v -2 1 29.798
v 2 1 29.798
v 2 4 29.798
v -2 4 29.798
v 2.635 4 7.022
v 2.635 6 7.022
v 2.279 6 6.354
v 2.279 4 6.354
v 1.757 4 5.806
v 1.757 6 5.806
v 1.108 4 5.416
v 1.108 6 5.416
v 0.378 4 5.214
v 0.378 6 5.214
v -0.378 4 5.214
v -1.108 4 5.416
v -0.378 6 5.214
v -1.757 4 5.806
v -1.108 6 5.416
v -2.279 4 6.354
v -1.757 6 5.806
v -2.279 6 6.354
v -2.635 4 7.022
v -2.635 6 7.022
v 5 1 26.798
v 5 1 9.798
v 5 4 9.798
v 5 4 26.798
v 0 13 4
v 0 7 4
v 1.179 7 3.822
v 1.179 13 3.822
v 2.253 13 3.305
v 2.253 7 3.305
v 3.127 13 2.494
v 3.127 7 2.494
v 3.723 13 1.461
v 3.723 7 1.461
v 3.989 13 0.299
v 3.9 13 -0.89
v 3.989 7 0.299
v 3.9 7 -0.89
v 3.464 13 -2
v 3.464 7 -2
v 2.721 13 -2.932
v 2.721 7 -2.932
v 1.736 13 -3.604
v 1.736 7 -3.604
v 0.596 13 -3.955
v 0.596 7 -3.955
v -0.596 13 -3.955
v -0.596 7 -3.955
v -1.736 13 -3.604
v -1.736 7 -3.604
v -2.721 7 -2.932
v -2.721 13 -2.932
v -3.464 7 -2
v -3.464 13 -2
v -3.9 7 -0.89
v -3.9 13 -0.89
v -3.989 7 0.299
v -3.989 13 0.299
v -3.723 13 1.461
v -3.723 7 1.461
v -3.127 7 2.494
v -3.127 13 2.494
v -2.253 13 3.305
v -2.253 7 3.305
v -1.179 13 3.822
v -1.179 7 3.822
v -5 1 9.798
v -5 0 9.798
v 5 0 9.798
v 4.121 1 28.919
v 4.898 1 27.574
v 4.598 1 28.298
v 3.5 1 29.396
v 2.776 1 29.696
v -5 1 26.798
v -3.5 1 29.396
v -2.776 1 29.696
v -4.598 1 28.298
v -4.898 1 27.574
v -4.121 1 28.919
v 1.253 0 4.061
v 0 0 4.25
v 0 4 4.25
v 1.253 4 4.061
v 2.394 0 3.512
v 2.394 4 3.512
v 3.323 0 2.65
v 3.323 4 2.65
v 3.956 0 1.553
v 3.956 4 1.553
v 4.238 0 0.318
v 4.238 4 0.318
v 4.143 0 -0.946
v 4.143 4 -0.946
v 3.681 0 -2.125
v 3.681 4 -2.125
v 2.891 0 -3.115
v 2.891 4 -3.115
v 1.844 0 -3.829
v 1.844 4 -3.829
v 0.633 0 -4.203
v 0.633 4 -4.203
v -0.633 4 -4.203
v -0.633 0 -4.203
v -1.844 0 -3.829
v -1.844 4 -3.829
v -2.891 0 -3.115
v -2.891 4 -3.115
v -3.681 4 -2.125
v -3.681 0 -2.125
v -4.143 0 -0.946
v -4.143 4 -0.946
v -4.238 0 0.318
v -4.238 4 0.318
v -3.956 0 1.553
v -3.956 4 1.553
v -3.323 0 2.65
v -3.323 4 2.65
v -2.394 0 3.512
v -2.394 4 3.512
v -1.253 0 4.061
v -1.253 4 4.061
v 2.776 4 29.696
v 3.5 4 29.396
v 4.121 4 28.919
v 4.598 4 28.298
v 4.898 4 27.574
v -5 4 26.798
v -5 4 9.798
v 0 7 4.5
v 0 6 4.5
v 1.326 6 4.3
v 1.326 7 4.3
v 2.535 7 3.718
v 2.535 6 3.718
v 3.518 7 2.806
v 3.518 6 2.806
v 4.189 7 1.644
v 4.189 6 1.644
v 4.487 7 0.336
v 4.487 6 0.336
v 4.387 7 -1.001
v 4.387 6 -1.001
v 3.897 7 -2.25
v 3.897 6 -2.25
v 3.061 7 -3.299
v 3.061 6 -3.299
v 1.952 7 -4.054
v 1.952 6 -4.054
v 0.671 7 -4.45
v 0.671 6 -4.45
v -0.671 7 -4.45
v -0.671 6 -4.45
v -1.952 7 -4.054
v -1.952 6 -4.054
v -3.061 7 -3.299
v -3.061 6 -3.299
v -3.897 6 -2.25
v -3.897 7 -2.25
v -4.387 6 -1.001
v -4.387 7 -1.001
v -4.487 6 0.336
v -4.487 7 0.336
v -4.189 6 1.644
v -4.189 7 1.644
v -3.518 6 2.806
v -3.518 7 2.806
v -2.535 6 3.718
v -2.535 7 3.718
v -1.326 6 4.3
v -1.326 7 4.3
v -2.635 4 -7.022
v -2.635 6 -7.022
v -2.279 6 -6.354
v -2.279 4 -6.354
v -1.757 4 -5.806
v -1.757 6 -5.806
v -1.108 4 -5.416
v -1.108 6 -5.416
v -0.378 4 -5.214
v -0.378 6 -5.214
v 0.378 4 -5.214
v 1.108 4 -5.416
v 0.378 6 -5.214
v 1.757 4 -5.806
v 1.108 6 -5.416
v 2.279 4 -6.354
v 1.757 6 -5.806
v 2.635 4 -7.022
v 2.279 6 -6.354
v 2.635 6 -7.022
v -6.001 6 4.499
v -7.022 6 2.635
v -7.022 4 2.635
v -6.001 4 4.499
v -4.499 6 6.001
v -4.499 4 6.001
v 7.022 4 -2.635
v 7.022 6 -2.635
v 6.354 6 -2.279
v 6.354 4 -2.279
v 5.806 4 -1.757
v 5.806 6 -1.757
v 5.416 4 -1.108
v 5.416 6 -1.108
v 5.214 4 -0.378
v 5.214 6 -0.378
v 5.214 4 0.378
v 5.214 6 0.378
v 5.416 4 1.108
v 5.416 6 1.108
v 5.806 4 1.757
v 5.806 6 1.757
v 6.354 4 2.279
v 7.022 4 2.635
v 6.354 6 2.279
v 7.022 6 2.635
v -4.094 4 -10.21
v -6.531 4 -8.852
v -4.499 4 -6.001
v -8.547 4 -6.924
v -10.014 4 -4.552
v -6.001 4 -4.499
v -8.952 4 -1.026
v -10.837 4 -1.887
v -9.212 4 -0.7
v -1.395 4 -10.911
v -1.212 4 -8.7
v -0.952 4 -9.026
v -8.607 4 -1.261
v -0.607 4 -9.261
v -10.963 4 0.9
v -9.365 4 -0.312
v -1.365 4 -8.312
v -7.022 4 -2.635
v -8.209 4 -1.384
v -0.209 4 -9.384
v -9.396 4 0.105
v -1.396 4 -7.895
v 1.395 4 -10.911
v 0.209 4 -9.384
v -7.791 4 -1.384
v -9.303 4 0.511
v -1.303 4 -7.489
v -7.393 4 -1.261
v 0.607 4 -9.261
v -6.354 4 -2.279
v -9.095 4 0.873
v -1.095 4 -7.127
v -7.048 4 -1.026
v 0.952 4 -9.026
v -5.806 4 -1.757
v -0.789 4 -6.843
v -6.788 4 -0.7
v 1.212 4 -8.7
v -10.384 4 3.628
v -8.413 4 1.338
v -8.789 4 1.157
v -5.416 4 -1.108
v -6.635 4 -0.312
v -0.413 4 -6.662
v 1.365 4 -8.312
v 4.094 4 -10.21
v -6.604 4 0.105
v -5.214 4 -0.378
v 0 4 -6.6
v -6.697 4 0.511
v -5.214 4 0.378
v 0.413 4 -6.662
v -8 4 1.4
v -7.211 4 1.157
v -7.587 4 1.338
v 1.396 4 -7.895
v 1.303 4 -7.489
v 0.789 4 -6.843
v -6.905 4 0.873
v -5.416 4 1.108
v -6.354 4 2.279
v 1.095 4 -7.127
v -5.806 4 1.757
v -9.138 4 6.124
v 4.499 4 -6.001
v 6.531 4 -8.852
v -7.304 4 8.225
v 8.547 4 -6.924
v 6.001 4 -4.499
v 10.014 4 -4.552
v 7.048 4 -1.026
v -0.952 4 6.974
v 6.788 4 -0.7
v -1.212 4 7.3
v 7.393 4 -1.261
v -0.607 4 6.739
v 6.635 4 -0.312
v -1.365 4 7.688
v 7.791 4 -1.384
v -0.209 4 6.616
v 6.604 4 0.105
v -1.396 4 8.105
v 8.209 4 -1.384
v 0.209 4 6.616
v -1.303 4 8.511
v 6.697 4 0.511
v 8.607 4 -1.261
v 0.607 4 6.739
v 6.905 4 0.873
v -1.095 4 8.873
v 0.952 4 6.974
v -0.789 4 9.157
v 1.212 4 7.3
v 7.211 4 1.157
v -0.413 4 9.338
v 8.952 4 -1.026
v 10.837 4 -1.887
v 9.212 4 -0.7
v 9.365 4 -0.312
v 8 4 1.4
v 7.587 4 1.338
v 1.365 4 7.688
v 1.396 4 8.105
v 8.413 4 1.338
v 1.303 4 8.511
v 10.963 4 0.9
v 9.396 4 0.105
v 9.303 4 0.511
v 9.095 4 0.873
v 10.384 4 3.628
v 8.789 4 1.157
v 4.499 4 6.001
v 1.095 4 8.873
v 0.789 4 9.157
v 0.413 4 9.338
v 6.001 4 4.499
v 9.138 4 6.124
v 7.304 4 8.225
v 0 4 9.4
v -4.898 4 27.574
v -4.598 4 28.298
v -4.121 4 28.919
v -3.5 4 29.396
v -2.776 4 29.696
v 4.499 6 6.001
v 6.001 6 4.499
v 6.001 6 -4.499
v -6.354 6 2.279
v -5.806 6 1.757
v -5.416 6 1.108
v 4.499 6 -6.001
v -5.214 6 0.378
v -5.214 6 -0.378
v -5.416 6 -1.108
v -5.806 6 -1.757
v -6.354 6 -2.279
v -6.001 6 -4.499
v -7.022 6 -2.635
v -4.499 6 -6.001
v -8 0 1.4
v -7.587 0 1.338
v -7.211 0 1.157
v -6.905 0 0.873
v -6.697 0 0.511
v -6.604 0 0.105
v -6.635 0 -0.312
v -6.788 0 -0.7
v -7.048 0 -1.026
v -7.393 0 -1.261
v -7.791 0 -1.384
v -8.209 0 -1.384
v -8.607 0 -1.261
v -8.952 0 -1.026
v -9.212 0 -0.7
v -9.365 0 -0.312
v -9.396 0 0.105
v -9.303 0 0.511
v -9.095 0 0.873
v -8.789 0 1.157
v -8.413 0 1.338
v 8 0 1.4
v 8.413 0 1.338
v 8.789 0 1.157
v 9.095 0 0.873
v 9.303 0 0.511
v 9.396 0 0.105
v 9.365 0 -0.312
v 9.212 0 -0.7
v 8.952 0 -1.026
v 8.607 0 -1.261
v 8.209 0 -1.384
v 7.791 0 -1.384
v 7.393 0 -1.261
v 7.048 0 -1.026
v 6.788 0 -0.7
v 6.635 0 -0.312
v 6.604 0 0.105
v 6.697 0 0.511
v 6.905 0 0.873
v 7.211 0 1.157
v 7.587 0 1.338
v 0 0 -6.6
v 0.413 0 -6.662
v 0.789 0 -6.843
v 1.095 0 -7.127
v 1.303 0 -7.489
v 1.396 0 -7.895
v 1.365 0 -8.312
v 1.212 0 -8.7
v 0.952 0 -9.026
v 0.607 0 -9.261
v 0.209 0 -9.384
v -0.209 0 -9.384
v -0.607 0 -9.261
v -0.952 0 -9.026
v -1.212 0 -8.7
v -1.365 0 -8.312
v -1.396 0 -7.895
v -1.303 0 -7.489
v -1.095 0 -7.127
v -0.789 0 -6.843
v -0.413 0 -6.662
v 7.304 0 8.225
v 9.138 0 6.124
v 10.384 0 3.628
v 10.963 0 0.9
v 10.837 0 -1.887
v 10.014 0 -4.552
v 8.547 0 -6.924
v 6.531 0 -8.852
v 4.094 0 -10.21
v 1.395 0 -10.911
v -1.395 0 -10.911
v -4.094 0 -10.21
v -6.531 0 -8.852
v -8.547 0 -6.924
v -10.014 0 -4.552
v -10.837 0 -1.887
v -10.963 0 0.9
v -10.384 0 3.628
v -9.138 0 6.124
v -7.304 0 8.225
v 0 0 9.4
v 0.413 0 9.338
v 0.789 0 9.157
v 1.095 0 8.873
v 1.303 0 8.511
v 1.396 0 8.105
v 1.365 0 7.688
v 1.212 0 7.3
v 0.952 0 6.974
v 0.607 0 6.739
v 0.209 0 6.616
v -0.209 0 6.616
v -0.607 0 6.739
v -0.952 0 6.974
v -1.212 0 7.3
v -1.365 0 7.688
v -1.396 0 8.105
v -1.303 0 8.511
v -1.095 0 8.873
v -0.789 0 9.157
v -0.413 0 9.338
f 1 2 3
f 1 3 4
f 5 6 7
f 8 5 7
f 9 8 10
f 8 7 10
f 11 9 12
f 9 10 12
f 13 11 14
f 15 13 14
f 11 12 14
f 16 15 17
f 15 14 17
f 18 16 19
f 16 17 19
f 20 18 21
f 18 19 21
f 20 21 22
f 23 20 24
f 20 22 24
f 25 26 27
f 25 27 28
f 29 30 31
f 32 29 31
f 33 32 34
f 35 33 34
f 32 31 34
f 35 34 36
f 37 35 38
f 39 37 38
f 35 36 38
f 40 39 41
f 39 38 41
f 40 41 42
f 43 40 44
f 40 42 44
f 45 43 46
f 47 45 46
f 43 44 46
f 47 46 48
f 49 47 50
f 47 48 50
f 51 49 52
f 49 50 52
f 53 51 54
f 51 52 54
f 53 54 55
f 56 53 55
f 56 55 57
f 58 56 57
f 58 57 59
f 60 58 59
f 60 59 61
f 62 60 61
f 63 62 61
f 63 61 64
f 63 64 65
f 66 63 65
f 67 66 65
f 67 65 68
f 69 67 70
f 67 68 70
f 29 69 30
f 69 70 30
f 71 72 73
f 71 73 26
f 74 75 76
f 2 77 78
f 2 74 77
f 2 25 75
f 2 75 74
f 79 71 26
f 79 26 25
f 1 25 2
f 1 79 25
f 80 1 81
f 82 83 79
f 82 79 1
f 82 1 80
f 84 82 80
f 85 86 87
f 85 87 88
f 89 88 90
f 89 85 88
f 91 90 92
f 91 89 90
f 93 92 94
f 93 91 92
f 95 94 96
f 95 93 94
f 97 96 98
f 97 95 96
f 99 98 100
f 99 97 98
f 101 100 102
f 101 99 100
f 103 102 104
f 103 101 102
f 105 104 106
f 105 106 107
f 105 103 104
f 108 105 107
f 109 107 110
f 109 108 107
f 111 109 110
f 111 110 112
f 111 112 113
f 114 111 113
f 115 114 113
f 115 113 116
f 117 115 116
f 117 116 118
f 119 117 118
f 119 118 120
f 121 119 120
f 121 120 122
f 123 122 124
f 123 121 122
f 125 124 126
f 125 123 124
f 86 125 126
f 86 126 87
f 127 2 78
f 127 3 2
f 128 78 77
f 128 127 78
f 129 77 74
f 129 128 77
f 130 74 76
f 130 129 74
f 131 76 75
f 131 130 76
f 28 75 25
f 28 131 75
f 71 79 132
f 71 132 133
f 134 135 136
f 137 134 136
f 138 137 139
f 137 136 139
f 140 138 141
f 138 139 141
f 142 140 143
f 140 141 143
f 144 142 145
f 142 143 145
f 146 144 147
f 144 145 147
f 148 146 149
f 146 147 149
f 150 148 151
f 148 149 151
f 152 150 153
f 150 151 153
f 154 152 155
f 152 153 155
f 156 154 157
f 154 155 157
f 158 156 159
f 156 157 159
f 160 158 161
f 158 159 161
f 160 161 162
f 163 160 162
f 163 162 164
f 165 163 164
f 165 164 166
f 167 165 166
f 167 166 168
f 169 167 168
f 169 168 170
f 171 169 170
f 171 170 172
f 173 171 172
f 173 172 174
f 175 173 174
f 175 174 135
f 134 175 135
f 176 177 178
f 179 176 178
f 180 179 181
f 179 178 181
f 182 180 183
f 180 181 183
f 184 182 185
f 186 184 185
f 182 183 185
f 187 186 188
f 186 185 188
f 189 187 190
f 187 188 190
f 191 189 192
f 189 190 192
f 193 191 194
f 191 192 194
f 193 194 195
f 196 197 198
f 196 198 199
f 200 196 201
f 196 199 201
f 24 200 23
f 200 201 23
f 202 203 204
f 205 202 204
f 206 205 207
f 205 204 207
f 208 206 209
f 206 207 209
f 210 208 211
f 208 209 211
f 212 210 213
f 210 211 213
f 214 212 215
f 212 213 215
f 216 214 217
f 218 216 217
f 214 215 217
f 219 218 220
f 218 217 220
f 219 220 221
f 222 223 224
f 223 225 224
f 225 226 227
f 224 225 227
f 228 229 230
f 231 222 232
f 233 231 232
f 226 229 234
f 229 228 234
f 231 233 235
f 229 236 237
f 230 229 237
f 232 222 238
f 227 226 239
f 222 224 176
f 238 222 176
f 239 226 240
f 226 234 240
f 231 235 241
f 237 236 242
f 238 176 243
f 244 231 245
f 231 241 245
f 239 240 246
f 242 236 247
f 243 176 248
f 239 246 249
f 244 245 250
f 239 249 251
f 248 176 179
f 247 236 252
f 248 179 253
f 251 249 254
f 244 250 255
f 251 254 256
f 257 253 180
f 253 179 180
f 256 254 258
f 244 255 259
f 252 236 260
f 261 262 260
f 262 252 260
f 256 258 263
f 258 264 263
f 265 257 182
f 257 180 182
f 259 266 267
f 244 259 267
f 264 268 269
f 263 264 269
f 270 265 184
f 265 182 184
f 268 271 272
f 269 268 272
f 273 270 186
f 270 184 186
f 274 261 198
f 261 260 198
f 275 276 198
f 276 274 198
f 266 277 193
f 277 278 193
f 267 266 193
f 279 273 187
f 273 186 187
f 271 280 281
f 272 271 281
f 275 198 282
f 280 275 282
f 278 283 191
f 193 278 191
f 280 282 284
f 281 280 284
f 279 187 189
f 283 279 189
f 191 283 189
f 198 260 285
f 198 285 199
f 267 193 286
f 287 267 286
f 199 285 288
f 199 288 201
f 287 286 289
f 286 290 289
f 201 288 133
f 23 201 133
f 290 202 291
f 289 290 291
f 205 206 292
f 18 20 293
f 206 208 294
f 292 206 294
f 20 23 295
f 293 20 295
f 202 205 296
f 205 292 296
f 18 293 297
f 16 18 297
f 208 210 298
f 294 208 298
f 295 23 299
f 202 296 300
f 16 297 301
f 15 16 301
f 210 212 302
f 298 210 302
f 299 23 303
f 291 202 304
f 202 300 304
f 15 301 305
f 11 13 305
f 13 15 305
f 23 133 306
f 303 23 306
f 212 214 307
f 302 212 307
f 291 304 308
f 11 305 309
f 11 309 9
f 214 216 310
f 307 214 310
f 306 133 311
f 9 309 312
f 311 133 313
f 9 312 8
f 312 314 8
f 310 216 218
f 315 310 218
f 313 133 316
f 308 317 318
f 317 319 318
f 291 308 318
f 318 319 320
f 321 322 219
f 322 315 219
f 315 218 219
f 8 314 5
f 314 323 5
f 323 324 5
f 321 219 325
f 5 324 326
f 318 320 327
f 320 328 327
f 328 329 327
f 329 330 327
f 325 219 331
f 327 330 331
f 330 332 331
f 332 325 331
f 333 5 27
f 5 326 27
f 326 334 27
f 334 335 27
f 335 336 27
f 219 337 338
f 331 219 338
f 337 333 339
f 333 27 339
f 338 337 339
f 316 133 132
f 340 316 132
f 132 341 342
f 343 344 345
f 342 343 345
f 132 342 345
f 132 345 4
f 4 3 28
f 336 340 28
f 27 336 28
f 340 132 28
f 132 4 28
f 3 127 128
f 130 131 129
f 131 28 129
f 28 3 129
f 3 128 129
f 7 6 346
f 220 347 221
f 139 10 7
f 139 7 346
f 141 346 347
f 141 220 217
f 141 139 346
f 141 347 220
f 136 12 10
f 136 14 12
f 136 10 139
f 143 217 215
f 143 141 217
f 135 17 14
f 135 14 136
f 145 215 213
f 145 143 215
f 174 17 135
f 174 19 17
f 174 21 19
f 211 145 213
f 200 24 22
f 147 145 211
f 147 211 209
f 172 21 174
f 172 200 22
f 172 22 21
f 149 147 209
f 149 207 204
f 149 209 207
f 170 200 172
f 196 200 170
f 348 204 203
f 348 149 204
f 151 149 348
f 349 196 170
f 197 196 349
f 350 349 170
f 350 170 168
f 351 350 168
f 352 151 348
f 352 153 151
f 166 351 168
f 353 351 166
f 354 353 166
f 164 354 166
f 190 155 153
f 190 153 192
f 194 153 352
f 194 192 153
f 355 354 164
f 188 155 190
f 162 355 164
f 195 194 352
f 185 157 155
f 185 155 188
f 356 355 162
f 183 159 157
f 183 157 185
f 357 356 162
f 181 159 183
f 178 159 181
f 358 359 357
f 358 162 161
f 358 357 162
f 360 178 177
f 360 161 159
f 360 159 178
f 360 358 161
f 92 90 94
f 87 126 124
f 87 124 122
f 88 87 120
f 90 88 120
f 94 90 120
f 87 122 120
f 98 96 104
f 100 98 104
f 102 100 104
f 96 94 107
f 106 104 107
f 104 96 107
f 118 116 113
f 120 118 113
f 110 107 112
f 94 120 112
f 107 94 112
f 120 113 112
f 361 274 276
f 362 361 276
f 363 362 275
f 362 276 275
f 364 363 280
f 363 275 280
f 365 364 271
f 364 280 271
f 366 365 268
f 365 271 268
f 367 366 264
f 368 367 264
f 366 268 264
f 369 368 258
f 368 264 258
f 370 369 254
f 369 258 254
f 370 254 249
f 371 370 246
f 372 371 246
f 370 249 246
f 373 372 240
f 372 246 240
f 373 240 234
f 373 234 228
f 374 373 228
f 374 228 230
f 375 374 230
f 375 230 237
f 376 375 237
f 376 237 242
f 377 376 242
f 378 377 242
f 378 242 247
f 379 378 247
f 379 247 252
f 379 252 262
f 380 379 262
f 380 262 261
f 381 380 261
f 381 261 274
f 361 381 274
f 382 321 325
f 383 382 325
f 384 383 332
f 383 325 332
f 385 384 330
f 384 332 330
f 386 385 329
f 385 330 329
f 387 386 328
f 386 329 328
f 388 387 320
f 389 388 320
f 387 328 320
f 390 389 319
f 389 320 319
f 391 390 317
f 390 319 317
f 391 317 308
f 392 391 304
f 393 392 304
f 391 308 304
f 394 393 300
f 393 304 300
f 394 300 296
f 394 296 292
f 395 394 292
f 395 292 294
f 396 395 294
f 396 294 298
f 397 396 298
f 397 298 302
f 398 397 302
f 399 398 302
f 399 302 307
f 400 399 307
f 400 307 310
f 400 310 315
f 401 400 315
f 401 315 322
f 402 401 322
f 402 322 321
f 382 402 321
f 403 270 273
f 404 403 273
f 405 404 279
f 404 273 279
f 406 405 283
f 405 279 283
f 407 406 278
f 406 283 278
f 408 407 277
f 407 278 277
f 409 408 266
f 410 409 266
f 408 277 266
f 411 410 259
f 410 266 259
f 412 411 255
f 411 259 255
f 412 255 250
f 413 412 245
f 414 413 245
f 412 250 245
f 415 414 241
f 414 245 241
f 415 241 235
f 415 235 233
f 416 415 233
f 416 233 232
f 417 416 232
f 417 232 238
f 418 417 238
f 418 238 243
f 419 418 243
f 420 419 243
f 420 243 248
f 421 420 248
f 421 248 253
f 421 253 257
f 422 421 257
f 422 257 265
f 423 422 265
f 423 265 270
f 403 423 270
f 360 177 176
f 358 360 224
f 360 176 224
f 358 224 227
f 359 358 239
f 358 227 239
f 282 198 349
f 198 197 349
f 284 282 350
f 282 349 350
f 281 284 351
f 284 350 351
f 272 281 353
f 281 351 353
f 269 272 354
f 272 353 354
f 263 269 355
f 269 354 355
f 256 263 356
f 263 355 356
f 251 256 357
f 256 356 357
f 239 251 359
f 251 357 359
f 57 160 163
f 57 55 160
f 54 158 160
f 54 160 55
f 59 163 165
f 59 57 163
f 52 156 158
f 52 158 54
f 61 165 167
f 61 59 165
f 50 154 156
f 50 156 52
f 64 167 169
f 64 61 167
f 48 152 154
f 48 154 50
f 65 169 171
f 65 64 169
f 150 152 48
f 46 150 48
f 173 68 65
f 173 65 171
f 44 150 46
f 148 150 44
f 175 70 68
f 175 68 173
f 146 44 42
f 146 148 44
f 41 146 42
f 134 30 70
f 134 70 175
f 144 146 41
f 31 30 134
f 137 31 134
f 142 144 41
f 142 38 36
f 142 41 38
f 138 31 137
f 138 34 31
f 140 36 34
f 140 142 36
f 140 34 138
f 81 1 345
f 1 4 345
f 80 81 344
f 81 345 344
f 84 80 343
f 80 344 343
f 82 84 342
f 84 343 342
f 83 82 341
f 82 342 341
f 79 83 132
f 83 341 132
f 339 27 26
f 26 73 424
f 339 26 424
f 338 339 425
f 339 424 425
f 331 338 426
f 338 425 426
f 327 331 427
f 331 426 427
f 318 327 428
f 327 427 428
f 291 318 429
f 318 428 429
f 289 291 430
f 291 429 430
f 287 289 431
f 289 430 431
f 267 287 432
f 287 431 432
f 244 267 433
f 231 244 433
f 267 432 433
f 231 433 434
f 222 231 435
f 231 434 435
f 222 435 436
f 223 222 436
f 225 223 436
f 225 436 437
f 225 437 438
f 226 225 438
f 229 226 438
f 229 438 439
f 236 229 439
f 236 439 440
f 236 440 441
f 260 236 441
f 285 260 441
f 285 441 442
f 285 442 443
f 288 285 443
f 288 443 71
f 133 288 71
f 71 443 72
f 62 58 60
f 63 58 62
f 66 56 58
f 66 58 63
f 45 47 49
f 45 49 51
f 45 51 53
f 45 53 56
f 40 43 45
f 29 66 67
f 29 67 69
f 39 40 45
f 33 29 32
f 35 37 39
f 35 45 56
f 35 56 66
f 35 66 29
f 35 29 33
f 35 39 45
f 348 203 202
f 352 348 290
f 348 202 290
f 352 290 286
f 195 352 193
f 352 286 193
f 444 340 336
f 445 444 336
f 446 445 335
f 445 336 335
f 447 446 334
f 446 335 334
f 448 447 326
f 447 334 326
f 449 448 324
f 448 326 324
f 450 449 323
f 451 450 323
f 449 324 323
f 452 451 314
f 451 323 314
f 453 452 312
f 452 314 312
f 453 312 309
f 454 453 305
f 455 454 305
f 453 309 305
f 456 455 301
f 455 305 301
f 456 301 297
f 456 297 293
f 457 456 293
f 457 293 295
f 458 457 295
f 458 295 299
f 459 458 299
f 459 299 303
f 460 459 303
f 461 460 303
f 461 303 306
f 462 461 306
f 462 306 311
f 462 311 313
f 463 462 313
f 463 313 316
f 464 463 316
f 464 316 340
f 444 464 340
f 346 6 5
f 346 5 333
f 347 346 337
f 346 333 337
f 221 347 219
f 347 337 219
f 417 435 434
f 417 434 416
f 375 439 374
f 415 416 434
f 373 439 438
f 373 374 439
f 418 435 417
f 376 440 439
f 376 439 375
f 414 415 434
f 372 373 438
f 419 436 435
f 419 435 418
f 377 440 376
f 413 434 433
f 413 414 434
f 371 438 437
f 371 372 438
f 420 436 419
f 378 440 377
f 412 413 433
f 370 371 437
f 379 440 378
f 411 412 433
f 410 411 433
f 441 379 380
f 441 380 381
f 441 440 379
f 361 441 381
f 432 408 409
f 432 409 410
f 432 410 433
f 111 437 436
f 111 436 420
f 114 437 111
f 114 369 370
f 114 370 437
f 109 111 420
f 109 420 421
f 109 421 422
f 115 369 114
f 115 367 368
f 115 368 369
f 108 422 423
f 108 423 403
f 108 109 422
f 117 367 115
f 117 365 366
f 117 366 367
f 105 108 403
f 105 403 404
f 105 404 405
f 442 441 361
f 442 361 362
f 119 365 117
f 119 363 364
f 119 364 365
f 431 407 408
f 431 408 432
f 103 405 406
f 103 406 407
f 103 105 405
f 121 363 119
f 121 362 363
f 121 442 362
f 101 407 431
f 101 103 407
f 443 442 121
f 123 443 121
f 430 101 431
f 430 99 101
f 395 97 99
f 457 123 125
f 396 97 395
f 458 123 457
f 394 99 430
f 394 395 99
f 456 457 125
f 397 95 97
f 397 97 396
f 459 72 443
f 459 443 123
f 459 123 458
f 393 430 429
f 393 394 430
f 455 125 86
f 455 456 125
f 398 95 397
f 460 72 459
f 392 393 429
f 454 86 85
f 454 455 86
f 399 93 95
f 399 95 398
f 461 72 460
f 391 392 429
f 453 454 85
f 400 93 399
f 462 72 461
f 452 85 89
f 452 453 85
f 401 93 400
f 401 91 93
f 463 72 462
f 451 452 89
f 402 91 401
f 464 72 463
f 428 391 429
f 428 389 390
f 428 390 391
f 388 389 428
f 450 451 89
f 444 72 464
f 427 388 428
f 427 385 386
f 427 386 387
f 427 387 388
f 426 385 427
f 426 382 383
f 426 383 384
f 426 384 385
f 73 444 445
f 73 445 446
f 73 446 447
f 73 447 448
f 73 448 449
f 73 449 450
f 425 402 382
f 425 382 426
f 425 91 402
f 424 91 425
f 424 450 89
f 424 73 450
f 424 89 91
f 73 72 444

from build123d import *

# Parameters (mm, degrees)
SKETCH1_R           = 11
SKETCH1_R_2         = 4.25
BOSS_EXTRUDE1_DEPTH = 4
SKETCH2_R           = 1.4
CUT_EXTRUDE1_DEPTH  = 17.062378404
SKETCH3_R           = 7.5
BOSS_EXTRUDE2_DEPTH = 2
SKETCH4_R           = 2.811136831
CUT_EXTRUDE2_DEPTH  = 2
SKETCH5_R           = 4.5
BOSS_EXTRUDE3_DEPTH = 7
CUT_EXTRUDE3_START  = -6
SKETCH6_R           = 4.5
SKETCH6_R_2         = 4
CUT_EXTRUDE3_DEPTH  = 6
BOSS_EXTRUDE4_DEPTH = 4
SKETCH11_W          = 20
SKETCH11_H          = 1
CUT_EXTRUDE5_DEPTH  = 37.234215306
FILLET1_R           = 3


with BuildPart() as part:
    # Sketch1 → Boss-Extrude1 (new body)
    with BuildSketch(Plane(origin=(0, 0, 0), x_dir=(1, 0, 0), z_dir=(0, 1, 0))):
        with Locations(Location((0, 0, 0), (0, 0, 270))):
            Circle(SKETCH1_R)
        with Locations(Location((0, 0, 0), (0, 0, 270))):
            Circle(SKETCH1_R_2, mode=Mode.SUBTRACT)
    extrude(amount=BOSS_EXTRUDE1_DEPTH)

    # Sketch2 → Cut-Extrude1 (cut, through all)
    with BuildSketch(Plane(origin=(0, 4, 0), x_dir=(1, 0, 0), z_dir=(0, 1, 0))):
        with Locations(Location((0, 8, 0), (0, 0, 270))):
            Circle(SKETCH2_R)
        with Locations(Location((8, 0, 0), (0, 0, 270))):
            Circle(SKETCH2_R)
        with Locations(Location((0, -8, 0), (0, 0, 270))):
            Circle(SKETCH2_R)
        with Locations(Location((-8, 0, 0), (0, 0, 270))):
            Circle(SKETCH2_R)
    extrude(amount=-CUT_EXTRUDE1_DEPTH, mode=Mode.SUBTRACT)

    # Sketch3 → Boss-Extrude2 (add)
    with BuildSketch(Plane(origin=(0, 4, 0), x_dir=(1, 0, 0), z_dir=(0, 1, 0))):
        with Locations(Location((0, 0, 0), (0, 0, 80.315835906))):
            Circle(SKETCH3_R)
    extrude(amount=BOSS_EXTRUDE2_DEPTH)

    # Sketch4 → Cut-Extrude2 (cut)
    with BuildSketch(Plane(origin=(0, 6, 0), x_dir=(1, 0, 0), z_dir=(0, 1, 0))):
        with Locations((8, 0)):
            Circle(SKETCH4_R)
        with Locations((0, -8)):
            Circle(SKETCH4_R)
        with Locations((-8, 0)):
            Circle(SKETCH4_R)
        with Locations((0, 8)):
            Circle(SKETCH4_R)
    extrude(amount=-CUT_EXTRUDE2_DEPTH, mode=Mode.SUBTRACT)

    # Sketch5 → Boss-Extrude3 (add)
    with BuildSketch(Plane(origin=(0, 6, 0), x_dir=(1, 0, 0), z_dir=(0, 1, 0))):
        with Locations(Location((0, 0, 0), (0, 0, 270))):
            Circle(SKETCH5_R)
    extrude(amount=BOSS_EXTRUDE3_DEPTH)

    # Sketch6 → Cut-Extrude3 (cut)
    with BuildSketch(Plane(origin=(0, 13, 0), x_dir=(1, 0, 0), z_dir=(0, 1, 0)).offset(CUT_EXTRUDE3_START)):
        with Locations(Location((0, 0, 0), (0, 0, 270))):
            Circle(SKETCH6_R)
        with Locations(Location((0, 0, 0), (0, 0, 270))):
            Circle(SKETCH6_R_2, mode=Mode.SUBTRACT)
    extrude(amount=CUT_EXTRUDE3_DEPTH, mode=Mode.SUBTRACT)

    # Sketch8 → Boss-Extrude4 (add)
    with BuildSketch(Plane.XZ):
        with BuildLine():
            Line((5, 29.797958971), (-5, 29.797958971))
            Line((-5, 29.797958971), (-5, 9.797958971))
            ThreePointArc((-5, 9.797958971), (0, 11), (5, 9.797958971))
            Line((5, 9.797958971), (5, 29.797958971))
        make_face()
    extrude(amount=-BOSS_EXTRUDE4_DEPTH)

    # Sketch11 → Cut-Extrude5 (cut, through all)
    with BuildSketch(Plane.ZY.offset(5)):
        with Locations((19.797958971, 0.5)):
            Rectangle(SKETCH11_W, SKETCH11_H)
    extrude(amount=-CUT_EXTRUDE5_DEPTH, mode=Mode.SUBTRACT)

    # Fillet1
    fillet1_edges = [part.edges().sort_by_distance(p)[0] for p in [
        (5, 2.5, 29.797958971),
        (-5, 2.5, 29.797958971),
    ]]
    fillet(fillet1_edges, radius=FILLET1_R)


solid = part.part
